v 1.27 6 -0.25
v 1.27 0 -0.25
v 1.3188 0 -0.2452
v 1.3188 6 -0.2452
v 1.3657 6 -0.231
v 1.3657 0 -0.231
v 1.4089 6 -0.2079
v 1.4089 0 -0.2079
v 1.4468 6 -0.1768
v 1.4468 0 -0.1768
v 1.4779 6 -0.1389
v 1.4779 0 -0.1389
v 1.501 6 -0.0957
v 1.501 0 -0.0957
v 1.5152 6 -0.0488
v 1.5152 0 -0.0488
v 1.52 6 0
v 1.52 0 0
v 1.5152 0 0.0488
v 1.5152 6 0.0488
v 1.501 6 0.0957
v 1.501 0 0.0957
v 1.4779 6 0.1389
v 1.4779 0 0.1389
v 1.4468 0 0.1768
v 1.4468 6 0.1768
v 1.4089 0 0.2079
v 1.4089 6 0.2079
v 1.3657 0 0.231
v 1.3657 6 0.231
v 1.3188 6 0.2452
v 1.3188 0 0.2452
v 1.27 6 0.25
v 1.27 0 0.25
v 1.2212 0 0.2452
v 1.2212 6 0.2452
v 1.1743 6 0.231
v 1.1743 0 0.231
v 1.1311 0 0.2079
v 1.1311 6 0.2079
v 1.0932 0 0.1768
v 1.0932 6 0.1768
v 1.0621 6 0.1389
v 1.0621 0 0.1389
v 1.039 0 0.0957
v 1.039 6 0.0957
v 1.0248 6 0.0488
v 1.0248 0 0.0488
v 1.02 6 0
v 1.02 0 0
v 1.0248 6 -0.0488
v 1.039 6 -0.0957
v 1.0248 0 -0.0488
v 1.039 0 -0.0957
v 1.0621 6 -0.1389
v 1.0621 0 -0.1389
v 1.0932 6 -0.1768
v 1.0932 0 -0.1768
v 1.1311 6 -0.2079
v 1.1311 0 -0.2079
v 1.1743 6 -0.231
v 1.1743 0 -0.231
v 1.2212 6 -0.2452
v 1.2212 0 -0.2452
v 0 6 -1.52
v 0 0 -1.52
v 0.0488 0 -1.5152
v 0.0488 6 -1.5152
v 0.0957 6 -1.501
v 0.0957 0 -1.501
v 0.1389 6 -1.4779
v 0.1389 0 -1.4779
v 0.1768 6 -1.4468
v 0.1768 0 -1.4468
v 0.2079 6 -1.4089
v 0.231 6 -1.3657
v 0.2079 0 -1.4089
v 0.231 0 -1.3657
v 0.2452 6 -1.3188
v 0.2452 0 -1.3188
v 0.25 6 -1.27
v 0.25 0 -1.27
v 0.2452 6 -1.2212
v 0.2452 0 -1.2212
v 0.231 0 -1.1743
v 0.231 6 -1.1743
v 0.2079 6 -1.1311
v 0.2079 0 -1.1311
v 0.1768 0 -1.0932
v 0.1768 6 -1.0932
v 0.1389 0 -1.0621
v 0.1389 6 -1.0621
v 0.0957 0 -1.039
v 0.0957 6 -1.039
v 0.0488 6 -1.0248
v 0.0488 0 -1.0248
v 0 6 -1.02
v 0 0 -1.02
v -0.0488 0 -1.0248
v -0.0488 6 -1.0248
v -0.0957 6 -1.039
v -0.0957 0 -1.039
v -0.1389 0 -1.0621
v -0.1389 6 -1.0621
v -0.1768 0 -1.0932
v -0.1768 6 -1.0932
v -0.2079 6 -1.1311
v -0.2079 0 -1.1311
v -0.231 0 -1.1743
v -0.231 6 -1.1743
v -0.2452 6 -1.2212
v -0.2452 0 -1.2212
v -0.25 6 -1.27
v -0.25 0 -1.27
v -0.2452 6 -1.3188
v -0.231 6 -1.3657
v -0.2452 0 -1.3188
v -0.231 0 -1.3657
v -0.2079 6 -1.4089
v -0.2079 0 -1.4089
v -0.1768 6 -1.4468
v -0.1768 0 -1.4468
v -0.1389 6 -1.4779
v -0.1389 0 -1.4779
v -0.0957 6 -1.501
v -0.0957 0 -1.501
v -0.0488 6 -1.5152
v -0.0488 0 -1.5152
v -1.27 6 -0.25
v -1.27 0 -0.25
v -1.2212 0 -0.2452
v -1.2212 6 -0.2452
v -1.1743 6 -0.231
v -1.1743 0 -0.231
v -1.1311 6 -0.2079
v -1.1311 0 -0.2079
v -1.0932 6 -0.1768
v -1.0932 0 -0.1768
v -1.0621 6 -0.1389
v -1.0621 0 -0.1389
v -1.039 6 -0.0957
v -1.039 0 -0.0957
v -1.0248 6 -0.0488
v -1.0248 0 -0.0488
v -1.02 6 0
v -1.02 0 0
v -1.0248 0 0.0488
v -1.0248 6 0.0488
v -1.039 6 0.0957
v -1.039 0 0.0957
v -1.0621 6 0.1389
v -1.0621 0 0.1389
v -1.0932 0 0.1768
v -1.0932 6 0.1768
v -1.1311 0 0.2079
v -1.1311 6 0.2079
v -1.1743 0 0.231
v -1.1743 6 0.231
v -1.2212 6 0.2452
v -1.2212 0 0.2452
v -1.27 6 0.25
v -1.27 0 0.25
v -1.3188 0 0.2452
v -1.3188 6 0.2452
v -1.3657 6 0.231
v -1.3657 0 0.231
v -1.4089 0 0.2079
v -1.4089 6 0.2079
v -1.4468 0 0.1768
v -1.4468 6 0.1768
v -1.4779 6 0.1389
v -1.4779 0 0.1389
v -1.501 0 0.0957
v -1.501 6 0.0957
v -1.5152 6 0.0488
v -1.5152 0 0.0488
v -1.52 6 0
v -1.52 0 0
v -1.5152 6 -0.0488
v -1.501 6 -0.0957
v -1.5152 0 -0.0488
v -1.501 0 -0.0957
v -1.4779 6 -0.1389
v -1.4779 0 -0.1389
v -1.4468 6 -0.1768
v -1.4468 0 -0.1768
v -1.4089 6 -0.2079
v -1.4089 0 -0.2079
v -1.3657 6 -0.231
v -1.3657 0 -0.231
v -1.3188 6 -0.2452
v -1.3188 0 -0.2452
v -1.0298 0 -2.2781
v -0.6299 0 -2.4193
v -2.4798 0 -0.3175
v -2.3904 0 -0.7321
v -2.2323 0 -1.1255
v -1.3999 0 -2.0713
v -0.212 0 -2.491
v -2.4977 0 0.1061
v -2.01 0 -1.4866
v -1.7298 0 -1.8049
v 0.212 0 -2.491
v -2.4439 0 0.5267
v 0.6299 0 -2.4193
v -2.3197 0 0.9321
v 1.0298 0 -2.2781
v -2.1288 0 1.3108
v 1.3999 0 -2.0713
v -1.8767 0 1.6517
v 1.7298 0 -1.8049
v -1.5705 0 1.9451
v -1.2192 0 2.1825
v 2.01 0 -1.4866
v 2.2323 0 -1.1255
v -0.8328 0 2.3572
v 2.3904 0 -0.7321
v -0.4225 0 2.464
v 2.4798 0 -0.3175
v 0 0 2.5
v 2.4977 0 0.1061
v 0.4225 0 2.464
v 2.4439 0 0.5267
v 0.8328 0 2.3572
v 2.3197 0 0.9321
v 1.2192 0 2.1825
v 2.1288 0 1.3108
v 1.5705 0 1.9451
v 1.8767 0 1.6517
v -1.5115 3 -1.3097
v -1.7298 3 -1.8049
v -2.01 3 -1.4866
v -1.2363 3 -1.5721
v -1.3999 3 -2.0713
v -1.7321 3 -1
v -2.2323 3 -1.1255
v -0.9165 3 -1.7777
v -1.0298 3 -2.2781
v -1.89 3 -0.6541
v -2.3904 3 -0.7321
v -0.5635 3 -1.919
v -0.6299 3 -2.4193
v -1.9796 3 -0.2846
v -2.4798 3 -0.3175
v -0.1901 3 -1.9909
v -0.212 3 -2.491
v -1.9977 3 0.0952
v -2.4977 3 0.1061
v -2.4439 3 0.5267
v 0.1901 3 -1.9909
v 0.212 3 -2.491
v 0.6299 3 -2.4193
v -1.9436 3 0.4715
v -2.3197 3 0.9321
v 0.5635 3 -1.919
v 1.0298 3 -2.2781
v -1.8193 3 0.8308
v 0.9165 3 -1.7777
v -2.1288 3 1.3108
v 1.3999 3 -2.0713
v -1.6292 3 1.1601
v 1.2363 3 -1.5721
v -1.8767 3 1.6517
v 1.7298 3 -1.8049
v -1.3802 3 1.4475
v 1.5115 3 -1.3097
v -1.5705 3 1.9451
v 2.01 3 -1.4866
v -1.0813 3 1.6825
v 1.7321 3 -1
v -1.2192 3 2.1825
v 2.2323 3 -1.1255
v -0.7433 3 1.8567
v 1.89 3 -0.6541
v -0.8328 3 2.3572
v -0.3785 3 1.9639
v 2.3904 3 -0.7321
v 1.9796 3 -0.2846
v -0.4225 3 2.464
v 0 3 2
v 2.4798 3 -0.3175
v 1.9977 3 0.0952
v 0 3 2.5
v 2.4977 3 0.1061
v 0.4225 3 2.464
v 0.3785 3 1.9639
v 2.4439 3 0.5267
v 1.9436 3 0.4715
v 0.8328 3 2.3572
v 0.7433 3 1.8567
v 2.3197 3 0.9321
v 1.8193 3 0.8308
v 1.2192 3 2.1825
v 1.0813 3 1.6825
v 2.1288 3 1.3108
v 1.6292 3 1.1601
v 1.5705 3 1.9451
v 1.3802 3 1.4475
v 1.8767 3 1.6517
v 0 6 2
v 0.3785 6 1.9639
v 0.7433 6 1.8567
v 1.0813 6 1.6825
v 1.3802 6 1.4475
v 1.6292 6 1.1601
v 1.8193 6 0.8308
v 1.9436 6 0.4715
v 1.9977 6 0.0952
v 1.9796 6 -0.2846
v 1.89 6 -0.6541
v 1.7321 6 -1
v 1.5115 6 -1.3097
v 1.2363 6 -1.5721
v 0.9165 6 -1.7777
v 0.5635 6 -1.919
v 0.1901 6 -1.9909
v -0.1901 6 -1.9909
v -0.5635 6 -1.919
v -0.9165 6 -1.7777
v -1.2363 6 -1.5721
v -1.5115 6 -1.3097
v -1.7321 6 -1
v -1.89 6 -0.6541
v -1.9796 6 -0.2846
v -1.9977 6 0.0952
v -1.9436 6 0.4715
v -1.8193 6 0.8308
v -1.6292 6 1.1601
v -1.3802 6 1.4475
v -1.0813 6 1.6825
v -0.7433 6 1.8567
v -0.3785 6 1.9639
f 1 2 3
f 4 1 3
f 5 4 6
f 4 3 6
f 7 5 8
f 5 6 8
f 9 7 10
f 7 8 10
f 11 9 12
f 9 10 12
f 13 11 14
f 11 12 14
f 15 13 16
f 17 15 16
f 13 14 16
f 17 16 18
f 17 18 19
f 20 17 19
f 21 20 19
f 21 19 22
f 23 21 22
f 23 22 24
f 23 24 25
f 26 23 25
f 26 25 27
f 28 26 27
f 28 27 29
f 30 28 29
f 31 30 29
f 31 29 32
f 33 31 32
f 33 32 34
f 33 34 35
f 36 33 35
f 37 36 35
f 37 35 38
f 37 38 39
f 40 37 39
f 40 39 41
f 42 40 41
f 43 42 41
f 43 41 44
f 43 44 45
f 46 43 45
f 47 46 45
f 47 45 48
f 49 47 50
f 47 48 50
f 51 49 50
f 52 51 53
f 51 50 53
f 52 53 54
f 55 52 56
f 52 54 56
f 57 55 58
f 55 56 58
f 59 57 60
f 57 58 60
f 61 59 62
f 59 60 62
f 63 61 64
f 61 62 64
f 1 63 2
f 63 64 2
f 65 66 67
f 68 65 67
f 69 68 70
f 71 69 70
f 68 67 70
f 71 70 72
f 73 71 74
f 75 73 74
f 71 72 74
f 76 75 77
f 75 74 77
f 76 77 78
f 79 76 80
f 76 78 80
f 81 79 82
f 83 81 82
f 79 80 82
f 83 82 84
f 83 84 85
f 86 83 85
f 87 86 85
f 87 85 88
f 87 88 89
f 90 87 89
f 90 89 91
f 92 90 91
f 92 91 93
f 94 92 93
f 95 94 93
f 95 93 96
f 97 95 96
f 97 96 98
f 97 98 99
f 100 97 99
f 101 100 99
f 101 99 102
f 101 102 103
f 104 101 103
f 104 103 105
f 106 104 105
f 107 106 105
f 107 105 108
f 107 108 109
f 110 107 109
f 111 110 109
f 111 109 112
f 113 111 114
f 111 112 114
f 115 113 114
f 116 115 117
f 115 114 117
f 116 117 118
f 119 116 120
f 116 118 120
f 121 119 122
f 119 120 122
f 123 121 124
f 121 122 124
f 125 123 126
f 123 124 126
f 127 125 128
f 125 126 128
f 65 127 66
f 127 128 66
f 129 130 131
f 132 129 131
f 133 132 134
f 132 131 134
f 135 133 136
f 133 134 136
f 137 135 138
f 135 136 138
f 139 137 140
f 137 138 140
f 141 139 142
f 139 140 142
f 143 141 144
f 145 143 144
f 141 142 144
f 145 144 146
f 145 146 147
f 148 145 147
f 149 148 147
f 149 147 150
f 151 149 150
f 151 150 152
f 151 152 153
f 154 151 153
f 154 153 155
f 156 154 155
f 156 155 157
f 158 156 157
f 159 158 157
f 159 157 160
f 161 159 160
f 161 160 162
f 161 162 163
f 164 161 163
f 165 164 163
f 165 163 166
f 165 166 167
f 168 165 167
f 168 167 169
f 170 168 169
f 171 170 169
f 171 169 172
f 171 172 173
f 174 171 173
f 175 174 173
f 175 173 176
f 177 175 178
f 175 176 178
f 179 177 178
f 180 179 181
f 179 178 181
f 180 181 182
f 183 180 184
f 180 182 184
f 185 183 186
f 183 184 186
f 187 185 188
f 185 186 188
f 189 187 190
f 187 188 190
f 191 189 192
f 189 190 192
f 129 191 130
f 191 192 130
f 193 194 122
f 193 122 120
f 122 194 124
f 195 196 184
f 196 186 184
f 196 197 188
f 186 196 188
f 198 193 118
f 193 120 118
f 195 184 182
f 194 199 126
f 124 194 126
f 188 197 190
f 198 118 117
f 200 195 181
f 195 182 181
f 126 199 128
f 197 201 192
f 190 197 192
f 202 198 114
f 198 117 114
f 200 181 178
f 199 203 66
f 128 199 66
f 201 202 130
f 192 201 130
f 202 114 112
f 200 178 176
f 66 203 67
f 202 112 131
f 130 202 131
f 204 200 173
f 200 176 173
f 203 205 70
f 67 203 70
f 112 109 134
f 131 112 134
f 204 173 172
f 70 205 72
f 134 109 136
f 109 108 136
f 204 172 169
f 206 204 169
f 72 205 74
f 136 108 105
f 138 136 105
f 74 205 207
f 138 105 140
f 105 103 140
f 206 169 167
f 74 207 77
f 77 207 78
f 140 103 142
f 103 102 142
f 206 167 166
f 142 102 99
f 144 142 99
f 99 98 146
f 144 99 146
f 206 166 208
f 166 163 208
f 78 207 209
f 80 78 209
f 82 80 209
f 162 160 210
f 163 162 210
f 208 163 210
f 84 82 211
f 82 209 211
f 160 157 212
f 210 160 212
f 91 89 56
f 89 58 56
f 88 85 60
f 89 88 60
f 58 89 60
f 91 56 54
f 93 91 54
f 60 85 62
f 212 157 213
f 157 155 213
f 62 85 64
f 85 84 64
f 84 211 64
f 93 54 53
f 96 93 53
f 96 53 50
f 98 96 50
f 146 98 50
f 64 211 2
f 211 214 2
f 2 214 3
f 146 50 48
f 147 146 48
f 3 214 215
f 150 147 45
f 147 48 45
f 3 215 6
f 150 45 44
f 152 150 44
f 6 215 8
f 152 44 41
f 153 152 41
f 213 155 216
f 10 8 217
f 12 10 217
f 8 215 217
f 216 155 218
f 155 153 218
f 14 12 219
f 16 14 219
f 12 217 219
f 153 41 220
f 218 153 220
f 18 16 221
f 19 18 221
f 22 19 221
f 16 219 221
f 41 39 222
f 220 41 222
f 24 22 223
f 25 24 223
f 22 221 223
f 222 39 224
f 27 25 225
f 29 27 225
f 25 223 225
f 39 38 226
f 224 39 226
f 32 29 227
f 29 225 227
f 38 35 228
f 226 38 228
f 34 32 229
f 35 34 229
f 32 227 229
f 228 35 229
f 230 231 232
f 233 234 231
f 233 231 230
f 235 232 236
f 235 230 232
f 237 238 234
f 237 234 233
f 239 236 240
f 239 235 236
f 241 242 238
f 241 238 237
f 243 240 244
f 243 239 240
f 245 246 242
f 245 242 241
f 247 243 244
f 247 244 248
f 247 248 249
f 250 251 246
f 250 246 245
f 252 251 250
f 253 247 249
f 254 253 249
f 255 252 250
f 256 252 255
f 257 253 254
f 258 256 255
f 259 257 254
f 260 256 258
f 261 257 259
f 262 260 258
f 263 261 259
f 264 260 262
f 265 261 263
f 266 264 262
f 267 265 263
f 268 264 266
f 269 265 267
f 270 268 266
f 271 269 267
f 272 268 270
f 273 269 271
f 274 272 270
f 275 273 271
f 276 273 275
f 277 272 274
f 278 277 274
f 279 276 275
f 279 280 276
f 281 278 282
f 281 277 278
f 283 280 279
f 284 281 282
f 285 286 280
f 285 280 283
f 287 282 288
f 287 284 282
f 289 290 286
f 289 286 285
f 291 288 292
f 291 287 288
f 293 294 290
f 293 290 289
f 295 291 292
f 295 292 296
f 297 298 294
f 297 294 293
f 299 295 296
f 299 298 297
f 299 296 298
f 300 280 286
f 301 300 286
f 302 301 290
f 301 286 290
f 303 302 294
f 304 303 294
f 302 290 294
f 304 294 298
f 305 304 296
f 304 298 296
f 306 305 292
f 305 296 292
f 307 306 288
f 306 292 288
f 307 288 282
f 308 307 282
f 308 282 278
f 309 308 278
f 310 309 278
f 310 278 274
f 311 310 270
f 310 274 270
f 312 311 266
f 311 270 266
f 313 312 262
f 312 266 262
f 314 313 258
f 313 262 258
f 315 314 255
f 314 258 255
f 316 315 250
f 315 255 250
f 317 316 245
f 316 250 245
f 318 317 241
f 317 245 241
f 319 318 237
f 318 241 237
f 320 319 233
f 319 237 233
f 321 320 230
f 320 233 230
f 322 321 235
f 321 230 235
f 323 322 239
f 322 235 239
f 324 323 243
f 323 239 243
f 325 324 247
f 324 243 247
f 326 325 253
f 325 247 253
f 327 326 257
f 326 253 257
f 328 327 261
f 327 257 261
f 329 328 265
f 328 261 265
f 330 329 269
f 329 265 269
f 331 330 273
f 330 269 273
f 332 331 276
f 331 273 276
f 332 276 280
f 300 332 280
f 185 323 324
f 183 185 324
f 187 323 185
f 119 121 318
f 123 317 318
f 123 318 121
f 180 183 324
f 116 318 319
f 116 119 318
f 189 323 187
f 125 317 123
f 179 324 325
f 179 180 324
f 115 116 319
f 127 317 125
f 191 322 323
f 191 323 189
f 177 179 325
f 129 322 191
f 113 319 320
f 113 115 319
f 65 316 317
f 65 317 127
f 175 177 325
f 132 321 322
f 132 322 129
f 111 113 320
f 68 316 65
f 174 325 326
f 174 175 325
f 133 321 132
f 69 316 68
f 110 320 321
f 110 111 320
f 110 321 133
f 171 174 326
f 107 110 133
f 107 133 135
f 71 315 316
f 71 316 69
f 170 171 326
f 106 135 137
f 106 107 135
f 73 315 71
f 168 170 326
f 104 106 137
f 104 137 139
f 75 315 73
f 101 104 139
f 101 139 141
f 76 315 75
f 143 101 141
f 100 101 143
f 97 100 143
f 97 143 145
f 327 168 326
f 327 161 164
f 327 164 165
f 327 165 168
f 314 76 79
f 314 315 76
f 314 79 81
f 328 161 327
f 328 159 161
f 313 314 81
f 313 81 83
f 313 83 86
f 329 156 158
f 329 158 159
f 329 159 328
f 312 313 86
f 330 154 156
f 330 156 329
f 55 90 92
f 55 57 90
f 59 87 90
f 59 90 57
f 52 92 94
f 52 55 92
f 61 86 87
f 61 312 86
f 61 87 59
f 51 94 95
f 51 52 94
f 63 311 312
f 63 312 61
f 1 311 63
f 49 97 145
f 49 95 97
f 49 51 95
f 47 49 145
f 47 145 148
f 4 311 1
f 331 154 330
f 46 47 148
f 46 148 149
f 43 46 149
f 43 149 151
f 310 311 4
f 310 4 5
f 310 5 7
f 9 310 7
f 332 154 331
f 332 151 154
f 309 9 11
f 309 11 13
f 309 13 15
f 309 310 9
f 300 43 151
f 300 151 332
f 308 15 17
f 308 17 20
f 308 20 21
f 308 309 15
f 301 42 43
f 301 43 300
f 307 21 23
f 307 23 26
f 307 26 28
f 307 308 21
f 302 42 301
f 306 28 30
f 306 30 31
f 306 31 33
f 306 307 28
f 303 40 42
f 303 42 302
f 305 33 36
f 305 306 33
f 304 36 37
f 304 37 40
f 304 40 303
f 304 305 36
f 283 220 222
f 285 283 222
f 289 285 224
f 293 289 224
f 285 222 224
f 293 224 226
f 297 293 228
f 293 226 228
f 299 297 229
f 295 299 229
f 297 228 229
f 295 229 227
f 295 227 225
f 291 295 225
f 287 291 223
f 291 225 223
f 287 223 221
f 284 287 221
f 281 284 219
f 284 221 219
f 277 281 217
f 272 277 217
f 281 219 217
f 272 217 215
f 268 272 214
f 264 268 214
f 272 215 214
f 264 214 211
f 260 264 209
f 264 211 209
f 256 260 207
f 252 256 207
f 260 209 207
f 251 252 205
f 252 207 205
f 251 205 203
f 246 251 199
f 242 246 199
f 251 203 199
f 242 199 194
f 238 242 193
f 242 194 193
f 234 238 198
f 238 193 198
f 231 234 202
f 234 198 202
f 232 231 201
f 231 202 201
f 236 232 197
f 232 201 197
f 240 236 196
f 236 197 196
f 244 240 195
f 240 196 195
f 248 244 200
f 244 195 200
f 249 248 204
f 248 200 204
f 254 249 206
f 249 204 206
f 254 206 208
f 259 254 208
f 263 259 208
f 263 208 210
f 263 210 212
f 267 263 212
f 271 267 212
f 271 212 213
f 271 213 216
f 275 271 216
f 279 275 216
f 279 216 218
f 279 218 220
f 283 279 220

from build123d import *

# Parameters (mm, degrees)
SKETCH_1_R          = 2.5
EXTRUDE_1_DEPTH     = 3
SKETCH_2_R          = 2
EXTRUDE_2_DEPTH     = 3
SKETCH_3_R          = 0.25
CUT_EXTRUDE_1_DEPTH = 10


with BuildPart() as part:
    # Эскиз1 → Бобышка-Вытянуть1 (new body)
    with BuildSketch(Plane(origin=(0, 0, 0), x_dir=(1, 0, 0), z_dir=(0, 1, 0))):
        with Locations(Location((0, 0, 0), (0, 0, 270))):
            Circle(SKETCH_1_R)
    extrude(amount=EXTRUDE_1_DEPTH)

    # Эскиз2 → Бобышка-Вытянуть2 (add)
    with BuildSketch(Plane(origin=(0, 3, 0), x_dir=(1, 0, 0), z_dir=(0, 1, 0))):
        with Locations(Location((0, 0, 0), (0, 0, 270))):
            Circle(SKETCH_2_R)
    extrude(amount=EXTRUDE_2_DEPTH)

    # Эскиз3 → Вырез-Вытянуть1 (cut)
    with BuildSketch(Plane.XZ):
        with Locations(Location((0, -1.27, 0), (0, 0, 270))):
            Circle(SKETCH_3_R)
        with Locations(Location((1.27, 0, 0), (0, 0, 270))):
            Circle(SKETCH_3_R)
        with Locations(Location((-1.27, 0, 0), (0, 0, 270))):
            Circle(SKETCH_3_R)
    extrude(amount=-CUT_EXTRUDE_1_DEPTH, mode=Mode.SUBTRACT)


solid = part.part
